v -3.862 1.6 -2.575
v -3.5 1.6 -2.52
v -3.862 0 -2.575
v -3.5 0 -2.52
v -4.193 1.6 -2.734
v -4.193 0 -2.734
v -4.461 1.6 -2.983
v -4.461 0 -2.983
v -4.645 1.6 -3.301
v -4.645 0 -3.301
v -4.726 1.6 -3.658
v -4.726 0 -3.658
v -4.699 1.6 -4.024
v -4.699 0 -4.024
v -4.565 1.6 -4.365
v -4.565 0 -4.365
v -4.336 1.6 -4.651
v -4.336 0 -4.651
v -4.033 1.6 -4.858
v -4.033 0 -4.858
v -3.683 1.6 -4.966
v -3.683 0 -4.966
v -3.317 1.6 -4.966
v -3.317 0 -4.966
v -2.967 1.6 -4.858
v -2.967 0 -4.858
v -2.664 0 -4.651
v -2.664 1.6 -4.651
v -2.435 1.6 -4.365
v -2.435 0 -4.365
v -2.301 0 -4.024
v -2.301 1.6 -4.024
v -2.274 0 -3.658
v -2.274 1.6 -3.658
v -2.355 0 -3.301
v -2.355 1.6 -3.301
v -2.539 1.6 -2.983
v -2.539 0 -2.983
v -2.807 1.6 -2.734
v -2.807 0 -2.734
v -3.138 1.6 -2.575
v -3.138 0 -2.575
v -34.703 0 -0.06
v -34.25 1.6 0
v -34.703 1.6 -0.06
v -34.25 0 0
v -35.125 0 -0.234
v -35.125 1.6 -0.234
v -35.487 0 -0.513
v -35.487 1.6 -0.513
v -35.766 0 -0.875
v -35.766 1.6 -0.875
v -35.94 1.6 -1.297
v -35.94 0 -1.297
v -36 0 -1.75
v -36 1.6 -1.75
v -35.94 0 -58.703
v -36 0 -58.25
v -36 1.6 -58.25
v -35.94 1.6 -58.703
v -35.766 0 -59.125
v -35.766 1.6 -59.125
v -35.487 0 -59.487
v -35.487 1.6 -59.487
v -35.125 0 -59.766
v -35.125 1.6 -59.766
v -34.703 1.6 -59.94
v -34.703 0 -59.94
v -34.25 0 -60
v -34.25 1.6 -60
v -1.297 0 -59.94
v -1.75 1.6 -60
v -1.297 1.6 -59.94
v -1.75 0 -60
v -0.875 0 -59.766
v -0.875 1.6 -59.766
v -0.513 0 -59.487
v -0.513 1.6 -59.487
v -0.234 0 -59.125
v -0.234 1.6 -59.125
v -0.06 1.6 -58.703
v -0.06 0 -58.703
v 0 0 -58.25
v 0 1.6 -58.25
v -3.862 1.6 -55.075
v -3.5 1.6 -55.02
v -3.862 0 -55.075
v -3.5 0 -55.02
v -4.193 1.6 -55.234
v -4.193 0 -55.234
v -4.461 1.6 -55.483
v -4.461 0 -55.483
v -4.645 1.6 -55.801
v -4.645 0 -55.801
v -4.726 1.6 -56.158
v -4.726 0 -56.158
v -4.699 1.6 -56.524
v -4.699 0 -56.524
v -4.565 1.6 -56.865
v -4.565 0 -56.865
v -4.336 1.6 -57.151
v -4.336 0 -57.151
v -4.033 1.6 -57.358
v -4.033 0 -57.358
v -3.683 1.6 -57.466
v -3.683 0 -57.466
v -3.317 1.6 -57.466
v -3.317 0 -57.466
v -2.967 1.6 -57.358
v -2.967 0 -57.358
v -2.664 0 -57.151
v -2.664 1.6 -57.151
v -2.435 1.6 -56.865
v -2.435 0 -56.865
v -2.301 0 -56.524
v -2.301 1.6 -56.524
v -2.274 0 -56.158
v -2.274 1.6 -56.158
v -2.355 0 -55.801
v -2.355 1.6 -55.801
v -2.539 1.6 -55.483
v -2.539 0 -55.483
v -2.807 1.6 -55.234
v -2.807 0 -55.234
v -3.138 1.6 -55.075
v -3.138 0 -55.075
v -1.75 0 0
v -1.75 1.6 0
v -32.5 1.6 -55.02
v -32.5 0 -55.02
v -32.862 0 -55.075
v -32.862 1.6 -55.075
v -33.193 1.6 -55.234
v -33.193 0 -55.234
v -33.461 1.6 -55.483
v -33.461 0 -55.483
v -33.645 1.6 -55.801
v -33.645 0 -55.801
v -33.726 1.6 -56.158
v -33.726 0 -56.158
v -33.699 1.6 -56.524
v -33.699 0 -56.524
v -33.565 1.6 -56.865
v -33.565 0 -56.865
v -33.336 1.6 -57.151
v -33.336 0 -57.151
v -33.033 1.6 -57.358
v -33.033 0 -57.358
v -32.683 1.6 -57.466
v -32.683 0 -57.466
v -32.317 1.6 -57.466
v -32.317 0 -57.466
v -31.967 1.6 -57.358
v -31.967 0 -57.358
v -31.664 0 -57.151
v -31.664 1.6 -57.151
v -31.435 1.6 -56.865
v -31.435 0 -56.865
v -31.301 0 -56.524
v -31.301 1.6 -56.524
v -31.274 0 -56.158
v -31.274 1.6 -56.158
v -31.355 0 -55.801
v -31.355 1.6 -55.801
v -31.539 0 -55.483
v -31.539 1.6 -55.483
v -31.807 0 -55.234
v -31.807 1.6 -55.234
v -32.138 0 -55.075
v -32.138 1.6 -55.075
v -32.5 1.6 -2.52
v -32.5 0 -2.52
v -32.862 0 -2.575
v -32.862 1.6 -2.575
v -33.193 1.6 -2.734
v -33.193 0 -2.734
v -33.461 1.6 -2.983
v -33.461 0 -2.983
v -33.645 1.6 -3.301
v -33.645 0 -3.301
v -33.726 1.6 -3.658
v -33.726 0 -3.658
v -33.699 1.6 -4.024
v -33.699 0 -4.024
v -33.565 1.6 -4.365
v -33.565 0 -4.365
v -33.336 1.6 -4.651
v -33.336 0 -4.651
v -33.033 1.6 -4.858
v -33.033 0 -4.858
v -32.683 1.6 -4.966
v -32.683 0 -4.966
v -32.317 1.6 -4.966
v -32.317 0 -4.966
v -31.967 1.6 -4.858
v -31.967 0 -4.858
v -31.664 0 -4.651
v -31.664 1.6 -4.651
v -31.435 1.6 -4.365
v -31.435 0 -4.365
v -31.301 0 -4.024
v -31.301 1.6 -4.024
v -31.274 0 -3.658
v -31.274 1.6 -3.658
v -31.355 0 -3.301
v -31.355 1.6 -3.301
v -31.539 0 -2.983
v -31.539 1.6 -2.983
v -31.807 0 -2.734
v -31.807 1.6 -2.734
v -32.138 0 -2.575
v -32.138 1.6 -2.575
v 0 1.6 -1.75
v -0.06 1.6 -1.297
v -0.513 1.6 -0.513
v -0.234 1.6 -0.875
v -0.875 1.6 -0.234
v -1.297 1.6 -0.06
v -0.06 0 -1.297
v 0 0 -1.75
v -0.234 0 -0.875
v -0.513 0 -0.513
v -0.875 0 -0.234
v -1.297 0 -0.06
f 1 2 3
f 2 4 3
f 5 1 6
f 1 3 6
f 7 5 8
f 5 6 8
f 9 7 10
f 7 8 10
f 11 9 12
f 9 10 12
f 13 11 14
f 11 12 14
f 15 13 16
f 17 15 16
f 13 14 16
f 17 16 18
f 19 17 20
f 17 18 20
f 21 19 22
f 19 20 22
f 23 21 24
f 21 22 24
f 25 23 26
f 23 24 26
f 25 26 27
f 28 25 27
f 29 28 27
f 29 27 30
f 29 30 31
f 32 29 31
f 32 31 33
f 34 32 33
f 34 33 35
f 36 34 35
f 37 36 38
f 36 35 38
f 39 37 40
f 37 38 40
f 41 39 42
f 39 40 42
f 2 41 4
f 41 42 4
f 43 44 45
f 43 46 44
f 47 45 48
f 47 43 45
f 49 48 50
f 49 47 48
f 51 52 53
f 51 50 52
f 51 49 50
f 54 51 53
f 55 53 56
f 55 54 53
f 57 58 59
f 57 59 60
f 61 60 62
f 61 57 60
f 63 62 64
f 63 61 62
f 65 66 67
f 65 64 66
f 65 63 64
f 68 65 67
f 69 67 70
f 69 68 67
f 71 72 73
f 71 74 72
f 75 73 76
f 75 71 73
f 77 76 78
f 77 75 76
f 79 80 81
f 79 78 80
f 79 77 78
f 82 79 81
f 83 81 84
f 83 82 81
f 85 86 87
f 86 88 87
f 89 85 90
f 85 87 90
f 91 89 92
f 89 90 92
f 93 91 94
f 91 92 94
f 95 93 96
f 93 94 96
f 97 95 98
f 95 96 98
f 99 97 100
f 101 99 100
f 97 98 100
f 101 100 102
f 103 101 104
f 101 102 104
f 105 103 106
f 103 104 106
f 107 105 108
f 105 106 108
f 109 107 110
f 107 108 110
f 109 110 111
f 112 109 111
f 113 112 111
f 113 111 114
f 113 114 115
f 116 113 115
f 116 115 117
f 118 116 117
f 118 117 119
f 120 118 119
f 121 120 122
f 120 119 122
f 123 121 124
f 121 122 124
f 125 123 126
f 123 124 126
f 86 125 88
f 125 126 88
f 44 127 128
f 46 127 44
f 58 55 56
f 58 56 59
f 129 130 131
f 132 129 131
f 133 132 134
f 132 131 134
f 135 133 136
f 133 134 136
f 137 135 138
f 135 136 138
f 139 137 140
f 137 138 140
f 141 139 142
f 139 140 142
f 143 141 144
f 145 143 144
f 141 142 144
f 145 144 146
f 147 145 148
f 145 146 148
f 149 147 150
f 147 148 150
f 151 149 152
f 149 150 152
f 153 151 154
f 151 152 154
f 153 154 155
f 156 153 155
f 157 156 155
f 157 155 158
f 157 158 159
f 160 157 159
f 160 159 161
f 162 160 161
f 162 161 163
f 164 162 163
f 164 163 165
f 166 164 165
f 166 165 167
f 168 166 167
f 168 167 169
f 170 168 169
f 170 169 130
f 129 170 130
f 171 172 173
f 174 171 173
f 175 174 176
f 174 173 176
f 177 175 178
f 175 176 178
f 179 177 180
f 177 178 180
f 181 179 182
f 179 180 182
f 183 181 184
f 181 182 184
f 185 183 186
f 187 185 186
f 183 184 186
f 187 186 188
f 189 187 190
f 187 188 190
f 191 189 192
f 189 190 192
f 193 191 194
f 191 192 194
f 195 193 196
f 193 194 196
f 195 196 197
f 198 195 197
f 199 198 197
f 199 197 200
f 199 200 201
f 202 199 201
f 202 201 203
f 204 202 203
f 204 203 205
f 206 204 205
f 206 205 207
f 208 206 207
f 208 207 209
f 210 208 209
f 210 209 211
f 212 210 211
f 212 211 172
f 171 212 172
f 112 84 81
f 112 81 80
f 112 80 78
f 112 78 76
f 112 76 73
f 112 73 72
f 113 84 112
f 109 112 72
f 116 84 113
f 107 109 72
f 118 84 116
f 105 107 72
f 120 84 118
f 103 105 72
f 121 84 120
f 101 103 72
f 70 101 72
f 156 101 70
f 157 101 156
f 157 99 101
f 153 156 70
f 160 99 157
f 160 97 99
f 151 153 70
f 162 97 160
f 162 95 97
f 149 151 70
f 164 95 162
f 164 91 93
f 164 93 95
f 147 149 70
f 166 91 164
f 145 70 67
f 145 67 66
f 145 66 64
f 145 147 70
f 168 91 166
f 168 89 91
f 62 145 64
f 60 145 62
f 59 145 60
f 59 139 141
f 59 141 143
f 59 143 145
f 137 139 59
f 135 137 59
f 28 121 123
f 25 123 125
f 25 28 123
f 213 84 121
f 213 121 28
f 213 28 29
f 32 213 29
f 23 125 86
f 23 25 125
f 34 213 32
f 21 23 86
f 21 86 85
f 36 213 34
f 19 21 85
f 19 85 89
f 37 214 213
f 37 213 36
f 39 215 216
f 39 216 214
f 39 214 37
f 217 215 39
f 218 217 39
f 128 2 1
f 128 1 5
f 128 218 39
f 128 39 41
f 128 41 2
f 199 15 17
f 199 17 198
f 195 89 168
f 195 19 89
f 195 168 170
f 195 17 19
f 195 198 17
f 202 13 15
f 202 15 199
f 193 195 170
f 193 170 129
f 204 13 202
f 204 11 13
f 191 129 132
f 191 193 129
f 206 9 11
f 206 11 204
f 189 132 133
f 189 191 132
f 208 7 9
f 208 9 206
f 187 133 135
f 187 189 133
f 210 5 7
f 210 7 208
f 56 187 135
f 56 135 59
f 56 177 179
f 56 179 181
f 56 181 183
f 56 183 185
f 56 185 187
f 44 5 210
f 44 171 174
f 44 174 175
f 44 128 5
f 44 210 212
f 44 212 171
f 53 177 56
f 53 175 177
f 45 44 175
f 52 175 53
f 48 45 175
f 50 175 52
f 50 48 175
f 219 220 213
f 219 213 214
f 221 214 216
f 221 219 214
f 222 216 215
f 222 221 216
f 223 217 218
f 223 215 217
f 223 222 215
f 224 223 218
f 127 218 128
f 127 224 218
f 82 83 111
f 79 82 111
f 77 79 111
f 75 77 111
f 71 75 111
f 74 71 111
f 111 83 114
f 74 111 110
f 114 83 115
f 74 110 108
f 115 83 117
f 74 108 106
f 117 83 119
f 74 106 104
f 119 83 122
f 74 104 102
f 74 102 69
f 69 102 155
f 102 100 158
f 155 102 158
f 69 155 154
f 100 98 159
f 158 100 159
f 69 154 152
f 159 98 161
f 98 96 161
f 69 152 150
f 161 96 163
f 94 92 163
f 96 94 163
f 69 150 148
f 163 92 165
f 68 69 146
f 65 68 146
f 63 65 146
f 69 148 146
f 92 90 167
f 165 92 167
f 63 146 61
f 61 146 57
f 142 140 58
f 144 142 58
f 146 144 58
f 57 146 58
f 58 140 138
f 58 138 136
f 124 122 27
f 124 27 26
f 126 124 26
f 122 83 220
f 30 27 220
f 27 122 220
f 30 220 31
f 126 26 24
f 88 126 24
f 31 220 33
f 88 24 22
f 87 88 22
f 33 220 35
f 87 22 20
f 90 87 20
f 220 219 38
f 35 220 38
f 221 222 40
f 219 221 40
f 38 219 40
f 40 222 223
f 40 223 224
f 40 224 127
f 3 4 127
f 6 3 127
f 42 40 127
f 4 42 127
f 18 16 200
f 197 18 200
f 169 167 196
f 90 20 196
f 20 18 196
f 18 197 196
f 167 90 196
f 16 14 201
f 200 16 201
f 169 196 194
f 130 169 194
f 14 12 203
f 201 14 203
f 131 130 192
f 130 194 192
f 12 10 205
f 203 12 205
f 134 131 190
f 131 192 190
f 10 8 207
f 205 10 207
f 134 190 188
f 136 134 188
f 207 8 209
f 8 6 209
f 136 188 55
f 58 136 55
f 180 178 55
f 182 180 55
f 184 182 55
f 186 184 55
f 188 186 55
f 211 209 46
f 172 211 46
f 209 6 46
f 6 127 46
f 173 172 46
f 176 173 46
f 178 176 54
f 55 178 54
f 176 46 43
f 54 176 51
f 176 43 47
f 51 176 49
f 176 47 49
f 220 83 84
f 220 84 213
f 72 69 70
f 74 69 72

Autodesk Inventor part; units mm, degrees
ref_plane "YZ Plane" through (0, 0, 0) normal (1, 0, 0) x (0, 1, 0)
ref_plane "XZ Plane" through (0, 0, 0) normal (0, 1, 0) x (-1, 0, 0)
ref_plane "XY Plane" through (0, 0, 0) normal (0, 0, 1) x (1, 0, 0)
sketch "Sketch1" plane through (0, 0, 0) normal (0, 1, 0) x (-1, 0, 0)
  line L0 (1.75, 0) -> (34.25, 0)
  line L1 (36, -1.75) -> (36, -58.25)
  line L2 (34.25, -60) -> (1.75, -60)
  line L3 (0, -58.25) -> (0, -1.75)
  arc A0 (36, -1.75) -> (34.25, 0) centre (34.25, -1.75) ccw
  arc A1 (1.75, 0) -> (0, -1.75) centre (1.75, -1.75) ccw
  arc A2 (0, -58.25) -> (1.75, -60) centre (1.75, -58.25) ccw
  arc A3 (34.25, -60) -> (36, -58.25) centre (34.25, -58.25) ccw
  point P0 (0, 0)
  point P1 (36, -60)
  point P2 (36, 0)
  point P3 (0, -60)
  dimension "d0" = 36
  dimension "d1" = 60
  dimension "d2" = 1.75
extrude "Extrusion1" add sketch "Sketch1" along normal blind 1.6
sketch "Sketch2" plane through (0, 1.6, 0) normal (0, 1, 0) x (1, 0, 0)
  line L0 (-32.5, 3.75) -> (-3.5, 3.75) construction
  line L1 (-3.5, 3.75) -> (-3.5, 56.25) construction
  line L2 (-3.5, 56.25) -> (-32.5, 56.25) construction
  line L3 (-32.5, 56.25) -> (-32.5, 3.75) construction
  line L4 (-36, 58.25) -> (-36, 1.75) projected
  line L5 (0, 1.75) -> (0, 58.25) projected
  line L6 (-1.75, 60) -> (-34.25, 60) projected
  line L7 (-34.25, 0) -> (-1.75, 0) projected
  point P0 (0, 0)
  dimension "d5" = 52.5
  dimension "d6" = 29
  dimension "d7" = 36
  dimension "d8" = 60
  dimension "d9" = 3.75
  dimension "d10" = 3.5
hole "Hole1" at (-32.5, 1.6, -3.75) at (-3.5, 1.6, -3.75) at (-3.5, 1.6, -56.25) at (-32.5, 1.6, -56.25) direction (0, -1, 0) diameter 2.459 depth 8.8 thread size "M3x0.5" class "6H" standard "ANSI Metric M Profile"
equation "\"d9\" = -0.5 * d5 + 0.5 * d8"
equation "\"d10\" = -0.5 * d6 + 0.5 * d7"
properties part number "Drok Step Down PCB"
